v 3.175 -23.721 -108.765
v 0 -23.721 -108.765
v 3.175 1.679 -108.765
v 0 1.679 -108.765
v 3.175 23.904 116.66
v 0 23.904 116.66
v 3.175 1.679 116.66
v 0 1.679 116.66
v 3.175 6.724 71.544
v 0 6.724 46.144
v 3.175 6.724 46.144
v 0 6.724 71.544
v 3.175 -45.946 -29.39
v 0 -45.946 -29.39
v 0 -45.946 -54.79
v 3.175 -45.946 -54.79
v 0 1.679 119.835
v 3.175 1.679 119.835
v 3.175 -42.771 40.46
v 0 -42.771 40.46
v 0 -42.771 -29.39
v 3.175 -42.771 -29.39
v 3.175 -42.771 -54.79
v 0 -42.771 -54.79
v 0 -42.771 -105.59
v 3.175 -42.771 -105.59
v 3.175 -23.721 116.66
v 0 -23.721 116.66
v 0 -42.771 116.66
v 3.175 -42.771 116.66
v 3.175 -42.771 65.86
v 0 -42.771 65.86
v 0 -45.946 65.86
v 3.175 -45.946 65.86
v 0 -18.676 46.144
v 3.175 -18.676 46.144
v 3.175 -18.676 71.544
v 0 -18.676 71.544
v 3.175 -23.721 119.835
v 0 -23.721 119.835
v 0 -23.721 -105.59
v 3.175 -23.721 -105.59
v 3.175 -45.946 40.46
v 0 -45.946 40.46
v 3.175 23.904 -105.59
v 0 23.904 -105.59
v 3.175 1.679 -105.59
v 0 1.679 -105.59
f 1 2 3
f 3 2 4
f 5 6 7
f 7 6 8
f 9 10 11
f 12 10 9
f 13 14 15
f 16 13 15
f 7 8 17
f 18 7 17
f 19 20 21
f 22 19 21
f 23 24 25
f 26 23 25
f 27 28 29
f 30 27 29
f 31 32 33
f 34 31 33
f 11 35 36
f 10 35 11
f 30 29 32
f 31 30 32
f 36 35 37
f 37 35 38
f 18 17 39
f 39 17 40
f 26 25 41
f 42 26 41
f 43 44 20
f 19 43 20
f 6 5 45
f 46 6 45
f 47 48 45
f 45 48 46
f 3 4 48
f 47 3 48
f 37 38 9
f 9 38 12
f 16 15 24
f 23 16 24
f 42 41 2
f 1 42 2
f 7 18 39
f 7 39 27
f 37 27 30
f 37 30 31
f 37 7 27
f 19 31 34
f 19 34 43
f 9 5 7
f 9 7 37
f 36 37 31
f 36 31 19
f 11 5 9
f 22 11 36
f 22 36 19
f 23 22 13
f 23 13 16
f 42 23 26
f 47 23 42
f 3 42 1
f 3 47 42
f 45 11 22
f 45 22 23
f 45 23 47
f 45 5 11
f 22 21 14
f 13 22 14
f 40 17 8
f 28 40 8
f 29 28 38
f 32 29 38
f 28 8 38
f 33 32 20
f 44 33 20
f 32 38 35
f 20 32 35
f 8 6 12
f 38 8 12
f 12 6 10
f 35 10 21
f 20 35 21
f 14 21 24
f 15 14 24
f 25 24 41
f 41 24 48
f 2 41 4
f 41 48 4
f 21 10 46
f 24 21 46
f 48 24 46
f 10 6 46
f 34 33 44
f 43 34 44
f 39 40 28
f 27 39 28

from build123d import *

# Parameters (mm, degrees)
BOSS_EXTRUDE1_DEPTH = 3.175
SKETCH2_W           = 222.25
SKETCH2_H           = 3.175
CUT_EXTRUDE1_DEPTH  = 4.175
SKETCH3_W           = 25.4
SKETCH3_H           = 25.4
CUT_EXTRUDE2_DEPTH  = 10


with BuildPart() as part:
    # Sketch1 → Boss-Extrude1 (new body)
    with BuildSketch(Plane(origin=(0, 0, 0), x_dir=(0, 0, -1), z_dir=(1, 0, 0))):
        Polygon((-116.659983875, 27.078998721), (-116.659983875, 1.678998721), (-119.834983875, 1.678998721), (-119.834983875, -23.721001279), (-116.659983875, -23.721001279), (-116.659983875, -42.771001279), (-65.859983875, -42.771001279), (-65.859983875, -45.946001279), (-40.459983875, -45.946001279), (-40.459983875, -42.771001279), (29.390016125, -42.771001279), (29.390016125, -45.946001279), (54.790016125, -45.946001279), (54.790016125, -42.771001279), (105.590016125, -42.771001279), (105.590016125, -23.721001279), (108.765016125, -23.721001279), (108.765016125, 1.678998721), (105.590016125, 1.678998721), (105.590016125, 27.078998721), align=None)
    extrude(amount=BOSS_EXTRUDE1_DEPTH)

    # Sketch2 → Cut-Extrude1 (cut, through all)
    with BuildSketch(Plane(origin=(3.175, 0, 0), x_dir=(0, 0, -1), z_dir=(1, 0, 0))):
        with Locations((-5.534983875, 25.491498721)):
            Rectangle(SKETCH2_W, SKETCH2_H)
    extrude(amount=-CUT_EXTRUDE1_DEPTH, mode=Mode.SUBTRACT)

    # Sketch3 → Cut-Extrude2 (cut)
    with BuildSketch(Plane.ZY):
        with Locations((58.843980592, -5.975859027)):
            Rectangle(SKETCH3_W, SKETCH3_H)
    extrude(amount=-CUT_EXTRUDE2_DEPTH, mode=Mode.SUBTRACT)


solid = part.part
